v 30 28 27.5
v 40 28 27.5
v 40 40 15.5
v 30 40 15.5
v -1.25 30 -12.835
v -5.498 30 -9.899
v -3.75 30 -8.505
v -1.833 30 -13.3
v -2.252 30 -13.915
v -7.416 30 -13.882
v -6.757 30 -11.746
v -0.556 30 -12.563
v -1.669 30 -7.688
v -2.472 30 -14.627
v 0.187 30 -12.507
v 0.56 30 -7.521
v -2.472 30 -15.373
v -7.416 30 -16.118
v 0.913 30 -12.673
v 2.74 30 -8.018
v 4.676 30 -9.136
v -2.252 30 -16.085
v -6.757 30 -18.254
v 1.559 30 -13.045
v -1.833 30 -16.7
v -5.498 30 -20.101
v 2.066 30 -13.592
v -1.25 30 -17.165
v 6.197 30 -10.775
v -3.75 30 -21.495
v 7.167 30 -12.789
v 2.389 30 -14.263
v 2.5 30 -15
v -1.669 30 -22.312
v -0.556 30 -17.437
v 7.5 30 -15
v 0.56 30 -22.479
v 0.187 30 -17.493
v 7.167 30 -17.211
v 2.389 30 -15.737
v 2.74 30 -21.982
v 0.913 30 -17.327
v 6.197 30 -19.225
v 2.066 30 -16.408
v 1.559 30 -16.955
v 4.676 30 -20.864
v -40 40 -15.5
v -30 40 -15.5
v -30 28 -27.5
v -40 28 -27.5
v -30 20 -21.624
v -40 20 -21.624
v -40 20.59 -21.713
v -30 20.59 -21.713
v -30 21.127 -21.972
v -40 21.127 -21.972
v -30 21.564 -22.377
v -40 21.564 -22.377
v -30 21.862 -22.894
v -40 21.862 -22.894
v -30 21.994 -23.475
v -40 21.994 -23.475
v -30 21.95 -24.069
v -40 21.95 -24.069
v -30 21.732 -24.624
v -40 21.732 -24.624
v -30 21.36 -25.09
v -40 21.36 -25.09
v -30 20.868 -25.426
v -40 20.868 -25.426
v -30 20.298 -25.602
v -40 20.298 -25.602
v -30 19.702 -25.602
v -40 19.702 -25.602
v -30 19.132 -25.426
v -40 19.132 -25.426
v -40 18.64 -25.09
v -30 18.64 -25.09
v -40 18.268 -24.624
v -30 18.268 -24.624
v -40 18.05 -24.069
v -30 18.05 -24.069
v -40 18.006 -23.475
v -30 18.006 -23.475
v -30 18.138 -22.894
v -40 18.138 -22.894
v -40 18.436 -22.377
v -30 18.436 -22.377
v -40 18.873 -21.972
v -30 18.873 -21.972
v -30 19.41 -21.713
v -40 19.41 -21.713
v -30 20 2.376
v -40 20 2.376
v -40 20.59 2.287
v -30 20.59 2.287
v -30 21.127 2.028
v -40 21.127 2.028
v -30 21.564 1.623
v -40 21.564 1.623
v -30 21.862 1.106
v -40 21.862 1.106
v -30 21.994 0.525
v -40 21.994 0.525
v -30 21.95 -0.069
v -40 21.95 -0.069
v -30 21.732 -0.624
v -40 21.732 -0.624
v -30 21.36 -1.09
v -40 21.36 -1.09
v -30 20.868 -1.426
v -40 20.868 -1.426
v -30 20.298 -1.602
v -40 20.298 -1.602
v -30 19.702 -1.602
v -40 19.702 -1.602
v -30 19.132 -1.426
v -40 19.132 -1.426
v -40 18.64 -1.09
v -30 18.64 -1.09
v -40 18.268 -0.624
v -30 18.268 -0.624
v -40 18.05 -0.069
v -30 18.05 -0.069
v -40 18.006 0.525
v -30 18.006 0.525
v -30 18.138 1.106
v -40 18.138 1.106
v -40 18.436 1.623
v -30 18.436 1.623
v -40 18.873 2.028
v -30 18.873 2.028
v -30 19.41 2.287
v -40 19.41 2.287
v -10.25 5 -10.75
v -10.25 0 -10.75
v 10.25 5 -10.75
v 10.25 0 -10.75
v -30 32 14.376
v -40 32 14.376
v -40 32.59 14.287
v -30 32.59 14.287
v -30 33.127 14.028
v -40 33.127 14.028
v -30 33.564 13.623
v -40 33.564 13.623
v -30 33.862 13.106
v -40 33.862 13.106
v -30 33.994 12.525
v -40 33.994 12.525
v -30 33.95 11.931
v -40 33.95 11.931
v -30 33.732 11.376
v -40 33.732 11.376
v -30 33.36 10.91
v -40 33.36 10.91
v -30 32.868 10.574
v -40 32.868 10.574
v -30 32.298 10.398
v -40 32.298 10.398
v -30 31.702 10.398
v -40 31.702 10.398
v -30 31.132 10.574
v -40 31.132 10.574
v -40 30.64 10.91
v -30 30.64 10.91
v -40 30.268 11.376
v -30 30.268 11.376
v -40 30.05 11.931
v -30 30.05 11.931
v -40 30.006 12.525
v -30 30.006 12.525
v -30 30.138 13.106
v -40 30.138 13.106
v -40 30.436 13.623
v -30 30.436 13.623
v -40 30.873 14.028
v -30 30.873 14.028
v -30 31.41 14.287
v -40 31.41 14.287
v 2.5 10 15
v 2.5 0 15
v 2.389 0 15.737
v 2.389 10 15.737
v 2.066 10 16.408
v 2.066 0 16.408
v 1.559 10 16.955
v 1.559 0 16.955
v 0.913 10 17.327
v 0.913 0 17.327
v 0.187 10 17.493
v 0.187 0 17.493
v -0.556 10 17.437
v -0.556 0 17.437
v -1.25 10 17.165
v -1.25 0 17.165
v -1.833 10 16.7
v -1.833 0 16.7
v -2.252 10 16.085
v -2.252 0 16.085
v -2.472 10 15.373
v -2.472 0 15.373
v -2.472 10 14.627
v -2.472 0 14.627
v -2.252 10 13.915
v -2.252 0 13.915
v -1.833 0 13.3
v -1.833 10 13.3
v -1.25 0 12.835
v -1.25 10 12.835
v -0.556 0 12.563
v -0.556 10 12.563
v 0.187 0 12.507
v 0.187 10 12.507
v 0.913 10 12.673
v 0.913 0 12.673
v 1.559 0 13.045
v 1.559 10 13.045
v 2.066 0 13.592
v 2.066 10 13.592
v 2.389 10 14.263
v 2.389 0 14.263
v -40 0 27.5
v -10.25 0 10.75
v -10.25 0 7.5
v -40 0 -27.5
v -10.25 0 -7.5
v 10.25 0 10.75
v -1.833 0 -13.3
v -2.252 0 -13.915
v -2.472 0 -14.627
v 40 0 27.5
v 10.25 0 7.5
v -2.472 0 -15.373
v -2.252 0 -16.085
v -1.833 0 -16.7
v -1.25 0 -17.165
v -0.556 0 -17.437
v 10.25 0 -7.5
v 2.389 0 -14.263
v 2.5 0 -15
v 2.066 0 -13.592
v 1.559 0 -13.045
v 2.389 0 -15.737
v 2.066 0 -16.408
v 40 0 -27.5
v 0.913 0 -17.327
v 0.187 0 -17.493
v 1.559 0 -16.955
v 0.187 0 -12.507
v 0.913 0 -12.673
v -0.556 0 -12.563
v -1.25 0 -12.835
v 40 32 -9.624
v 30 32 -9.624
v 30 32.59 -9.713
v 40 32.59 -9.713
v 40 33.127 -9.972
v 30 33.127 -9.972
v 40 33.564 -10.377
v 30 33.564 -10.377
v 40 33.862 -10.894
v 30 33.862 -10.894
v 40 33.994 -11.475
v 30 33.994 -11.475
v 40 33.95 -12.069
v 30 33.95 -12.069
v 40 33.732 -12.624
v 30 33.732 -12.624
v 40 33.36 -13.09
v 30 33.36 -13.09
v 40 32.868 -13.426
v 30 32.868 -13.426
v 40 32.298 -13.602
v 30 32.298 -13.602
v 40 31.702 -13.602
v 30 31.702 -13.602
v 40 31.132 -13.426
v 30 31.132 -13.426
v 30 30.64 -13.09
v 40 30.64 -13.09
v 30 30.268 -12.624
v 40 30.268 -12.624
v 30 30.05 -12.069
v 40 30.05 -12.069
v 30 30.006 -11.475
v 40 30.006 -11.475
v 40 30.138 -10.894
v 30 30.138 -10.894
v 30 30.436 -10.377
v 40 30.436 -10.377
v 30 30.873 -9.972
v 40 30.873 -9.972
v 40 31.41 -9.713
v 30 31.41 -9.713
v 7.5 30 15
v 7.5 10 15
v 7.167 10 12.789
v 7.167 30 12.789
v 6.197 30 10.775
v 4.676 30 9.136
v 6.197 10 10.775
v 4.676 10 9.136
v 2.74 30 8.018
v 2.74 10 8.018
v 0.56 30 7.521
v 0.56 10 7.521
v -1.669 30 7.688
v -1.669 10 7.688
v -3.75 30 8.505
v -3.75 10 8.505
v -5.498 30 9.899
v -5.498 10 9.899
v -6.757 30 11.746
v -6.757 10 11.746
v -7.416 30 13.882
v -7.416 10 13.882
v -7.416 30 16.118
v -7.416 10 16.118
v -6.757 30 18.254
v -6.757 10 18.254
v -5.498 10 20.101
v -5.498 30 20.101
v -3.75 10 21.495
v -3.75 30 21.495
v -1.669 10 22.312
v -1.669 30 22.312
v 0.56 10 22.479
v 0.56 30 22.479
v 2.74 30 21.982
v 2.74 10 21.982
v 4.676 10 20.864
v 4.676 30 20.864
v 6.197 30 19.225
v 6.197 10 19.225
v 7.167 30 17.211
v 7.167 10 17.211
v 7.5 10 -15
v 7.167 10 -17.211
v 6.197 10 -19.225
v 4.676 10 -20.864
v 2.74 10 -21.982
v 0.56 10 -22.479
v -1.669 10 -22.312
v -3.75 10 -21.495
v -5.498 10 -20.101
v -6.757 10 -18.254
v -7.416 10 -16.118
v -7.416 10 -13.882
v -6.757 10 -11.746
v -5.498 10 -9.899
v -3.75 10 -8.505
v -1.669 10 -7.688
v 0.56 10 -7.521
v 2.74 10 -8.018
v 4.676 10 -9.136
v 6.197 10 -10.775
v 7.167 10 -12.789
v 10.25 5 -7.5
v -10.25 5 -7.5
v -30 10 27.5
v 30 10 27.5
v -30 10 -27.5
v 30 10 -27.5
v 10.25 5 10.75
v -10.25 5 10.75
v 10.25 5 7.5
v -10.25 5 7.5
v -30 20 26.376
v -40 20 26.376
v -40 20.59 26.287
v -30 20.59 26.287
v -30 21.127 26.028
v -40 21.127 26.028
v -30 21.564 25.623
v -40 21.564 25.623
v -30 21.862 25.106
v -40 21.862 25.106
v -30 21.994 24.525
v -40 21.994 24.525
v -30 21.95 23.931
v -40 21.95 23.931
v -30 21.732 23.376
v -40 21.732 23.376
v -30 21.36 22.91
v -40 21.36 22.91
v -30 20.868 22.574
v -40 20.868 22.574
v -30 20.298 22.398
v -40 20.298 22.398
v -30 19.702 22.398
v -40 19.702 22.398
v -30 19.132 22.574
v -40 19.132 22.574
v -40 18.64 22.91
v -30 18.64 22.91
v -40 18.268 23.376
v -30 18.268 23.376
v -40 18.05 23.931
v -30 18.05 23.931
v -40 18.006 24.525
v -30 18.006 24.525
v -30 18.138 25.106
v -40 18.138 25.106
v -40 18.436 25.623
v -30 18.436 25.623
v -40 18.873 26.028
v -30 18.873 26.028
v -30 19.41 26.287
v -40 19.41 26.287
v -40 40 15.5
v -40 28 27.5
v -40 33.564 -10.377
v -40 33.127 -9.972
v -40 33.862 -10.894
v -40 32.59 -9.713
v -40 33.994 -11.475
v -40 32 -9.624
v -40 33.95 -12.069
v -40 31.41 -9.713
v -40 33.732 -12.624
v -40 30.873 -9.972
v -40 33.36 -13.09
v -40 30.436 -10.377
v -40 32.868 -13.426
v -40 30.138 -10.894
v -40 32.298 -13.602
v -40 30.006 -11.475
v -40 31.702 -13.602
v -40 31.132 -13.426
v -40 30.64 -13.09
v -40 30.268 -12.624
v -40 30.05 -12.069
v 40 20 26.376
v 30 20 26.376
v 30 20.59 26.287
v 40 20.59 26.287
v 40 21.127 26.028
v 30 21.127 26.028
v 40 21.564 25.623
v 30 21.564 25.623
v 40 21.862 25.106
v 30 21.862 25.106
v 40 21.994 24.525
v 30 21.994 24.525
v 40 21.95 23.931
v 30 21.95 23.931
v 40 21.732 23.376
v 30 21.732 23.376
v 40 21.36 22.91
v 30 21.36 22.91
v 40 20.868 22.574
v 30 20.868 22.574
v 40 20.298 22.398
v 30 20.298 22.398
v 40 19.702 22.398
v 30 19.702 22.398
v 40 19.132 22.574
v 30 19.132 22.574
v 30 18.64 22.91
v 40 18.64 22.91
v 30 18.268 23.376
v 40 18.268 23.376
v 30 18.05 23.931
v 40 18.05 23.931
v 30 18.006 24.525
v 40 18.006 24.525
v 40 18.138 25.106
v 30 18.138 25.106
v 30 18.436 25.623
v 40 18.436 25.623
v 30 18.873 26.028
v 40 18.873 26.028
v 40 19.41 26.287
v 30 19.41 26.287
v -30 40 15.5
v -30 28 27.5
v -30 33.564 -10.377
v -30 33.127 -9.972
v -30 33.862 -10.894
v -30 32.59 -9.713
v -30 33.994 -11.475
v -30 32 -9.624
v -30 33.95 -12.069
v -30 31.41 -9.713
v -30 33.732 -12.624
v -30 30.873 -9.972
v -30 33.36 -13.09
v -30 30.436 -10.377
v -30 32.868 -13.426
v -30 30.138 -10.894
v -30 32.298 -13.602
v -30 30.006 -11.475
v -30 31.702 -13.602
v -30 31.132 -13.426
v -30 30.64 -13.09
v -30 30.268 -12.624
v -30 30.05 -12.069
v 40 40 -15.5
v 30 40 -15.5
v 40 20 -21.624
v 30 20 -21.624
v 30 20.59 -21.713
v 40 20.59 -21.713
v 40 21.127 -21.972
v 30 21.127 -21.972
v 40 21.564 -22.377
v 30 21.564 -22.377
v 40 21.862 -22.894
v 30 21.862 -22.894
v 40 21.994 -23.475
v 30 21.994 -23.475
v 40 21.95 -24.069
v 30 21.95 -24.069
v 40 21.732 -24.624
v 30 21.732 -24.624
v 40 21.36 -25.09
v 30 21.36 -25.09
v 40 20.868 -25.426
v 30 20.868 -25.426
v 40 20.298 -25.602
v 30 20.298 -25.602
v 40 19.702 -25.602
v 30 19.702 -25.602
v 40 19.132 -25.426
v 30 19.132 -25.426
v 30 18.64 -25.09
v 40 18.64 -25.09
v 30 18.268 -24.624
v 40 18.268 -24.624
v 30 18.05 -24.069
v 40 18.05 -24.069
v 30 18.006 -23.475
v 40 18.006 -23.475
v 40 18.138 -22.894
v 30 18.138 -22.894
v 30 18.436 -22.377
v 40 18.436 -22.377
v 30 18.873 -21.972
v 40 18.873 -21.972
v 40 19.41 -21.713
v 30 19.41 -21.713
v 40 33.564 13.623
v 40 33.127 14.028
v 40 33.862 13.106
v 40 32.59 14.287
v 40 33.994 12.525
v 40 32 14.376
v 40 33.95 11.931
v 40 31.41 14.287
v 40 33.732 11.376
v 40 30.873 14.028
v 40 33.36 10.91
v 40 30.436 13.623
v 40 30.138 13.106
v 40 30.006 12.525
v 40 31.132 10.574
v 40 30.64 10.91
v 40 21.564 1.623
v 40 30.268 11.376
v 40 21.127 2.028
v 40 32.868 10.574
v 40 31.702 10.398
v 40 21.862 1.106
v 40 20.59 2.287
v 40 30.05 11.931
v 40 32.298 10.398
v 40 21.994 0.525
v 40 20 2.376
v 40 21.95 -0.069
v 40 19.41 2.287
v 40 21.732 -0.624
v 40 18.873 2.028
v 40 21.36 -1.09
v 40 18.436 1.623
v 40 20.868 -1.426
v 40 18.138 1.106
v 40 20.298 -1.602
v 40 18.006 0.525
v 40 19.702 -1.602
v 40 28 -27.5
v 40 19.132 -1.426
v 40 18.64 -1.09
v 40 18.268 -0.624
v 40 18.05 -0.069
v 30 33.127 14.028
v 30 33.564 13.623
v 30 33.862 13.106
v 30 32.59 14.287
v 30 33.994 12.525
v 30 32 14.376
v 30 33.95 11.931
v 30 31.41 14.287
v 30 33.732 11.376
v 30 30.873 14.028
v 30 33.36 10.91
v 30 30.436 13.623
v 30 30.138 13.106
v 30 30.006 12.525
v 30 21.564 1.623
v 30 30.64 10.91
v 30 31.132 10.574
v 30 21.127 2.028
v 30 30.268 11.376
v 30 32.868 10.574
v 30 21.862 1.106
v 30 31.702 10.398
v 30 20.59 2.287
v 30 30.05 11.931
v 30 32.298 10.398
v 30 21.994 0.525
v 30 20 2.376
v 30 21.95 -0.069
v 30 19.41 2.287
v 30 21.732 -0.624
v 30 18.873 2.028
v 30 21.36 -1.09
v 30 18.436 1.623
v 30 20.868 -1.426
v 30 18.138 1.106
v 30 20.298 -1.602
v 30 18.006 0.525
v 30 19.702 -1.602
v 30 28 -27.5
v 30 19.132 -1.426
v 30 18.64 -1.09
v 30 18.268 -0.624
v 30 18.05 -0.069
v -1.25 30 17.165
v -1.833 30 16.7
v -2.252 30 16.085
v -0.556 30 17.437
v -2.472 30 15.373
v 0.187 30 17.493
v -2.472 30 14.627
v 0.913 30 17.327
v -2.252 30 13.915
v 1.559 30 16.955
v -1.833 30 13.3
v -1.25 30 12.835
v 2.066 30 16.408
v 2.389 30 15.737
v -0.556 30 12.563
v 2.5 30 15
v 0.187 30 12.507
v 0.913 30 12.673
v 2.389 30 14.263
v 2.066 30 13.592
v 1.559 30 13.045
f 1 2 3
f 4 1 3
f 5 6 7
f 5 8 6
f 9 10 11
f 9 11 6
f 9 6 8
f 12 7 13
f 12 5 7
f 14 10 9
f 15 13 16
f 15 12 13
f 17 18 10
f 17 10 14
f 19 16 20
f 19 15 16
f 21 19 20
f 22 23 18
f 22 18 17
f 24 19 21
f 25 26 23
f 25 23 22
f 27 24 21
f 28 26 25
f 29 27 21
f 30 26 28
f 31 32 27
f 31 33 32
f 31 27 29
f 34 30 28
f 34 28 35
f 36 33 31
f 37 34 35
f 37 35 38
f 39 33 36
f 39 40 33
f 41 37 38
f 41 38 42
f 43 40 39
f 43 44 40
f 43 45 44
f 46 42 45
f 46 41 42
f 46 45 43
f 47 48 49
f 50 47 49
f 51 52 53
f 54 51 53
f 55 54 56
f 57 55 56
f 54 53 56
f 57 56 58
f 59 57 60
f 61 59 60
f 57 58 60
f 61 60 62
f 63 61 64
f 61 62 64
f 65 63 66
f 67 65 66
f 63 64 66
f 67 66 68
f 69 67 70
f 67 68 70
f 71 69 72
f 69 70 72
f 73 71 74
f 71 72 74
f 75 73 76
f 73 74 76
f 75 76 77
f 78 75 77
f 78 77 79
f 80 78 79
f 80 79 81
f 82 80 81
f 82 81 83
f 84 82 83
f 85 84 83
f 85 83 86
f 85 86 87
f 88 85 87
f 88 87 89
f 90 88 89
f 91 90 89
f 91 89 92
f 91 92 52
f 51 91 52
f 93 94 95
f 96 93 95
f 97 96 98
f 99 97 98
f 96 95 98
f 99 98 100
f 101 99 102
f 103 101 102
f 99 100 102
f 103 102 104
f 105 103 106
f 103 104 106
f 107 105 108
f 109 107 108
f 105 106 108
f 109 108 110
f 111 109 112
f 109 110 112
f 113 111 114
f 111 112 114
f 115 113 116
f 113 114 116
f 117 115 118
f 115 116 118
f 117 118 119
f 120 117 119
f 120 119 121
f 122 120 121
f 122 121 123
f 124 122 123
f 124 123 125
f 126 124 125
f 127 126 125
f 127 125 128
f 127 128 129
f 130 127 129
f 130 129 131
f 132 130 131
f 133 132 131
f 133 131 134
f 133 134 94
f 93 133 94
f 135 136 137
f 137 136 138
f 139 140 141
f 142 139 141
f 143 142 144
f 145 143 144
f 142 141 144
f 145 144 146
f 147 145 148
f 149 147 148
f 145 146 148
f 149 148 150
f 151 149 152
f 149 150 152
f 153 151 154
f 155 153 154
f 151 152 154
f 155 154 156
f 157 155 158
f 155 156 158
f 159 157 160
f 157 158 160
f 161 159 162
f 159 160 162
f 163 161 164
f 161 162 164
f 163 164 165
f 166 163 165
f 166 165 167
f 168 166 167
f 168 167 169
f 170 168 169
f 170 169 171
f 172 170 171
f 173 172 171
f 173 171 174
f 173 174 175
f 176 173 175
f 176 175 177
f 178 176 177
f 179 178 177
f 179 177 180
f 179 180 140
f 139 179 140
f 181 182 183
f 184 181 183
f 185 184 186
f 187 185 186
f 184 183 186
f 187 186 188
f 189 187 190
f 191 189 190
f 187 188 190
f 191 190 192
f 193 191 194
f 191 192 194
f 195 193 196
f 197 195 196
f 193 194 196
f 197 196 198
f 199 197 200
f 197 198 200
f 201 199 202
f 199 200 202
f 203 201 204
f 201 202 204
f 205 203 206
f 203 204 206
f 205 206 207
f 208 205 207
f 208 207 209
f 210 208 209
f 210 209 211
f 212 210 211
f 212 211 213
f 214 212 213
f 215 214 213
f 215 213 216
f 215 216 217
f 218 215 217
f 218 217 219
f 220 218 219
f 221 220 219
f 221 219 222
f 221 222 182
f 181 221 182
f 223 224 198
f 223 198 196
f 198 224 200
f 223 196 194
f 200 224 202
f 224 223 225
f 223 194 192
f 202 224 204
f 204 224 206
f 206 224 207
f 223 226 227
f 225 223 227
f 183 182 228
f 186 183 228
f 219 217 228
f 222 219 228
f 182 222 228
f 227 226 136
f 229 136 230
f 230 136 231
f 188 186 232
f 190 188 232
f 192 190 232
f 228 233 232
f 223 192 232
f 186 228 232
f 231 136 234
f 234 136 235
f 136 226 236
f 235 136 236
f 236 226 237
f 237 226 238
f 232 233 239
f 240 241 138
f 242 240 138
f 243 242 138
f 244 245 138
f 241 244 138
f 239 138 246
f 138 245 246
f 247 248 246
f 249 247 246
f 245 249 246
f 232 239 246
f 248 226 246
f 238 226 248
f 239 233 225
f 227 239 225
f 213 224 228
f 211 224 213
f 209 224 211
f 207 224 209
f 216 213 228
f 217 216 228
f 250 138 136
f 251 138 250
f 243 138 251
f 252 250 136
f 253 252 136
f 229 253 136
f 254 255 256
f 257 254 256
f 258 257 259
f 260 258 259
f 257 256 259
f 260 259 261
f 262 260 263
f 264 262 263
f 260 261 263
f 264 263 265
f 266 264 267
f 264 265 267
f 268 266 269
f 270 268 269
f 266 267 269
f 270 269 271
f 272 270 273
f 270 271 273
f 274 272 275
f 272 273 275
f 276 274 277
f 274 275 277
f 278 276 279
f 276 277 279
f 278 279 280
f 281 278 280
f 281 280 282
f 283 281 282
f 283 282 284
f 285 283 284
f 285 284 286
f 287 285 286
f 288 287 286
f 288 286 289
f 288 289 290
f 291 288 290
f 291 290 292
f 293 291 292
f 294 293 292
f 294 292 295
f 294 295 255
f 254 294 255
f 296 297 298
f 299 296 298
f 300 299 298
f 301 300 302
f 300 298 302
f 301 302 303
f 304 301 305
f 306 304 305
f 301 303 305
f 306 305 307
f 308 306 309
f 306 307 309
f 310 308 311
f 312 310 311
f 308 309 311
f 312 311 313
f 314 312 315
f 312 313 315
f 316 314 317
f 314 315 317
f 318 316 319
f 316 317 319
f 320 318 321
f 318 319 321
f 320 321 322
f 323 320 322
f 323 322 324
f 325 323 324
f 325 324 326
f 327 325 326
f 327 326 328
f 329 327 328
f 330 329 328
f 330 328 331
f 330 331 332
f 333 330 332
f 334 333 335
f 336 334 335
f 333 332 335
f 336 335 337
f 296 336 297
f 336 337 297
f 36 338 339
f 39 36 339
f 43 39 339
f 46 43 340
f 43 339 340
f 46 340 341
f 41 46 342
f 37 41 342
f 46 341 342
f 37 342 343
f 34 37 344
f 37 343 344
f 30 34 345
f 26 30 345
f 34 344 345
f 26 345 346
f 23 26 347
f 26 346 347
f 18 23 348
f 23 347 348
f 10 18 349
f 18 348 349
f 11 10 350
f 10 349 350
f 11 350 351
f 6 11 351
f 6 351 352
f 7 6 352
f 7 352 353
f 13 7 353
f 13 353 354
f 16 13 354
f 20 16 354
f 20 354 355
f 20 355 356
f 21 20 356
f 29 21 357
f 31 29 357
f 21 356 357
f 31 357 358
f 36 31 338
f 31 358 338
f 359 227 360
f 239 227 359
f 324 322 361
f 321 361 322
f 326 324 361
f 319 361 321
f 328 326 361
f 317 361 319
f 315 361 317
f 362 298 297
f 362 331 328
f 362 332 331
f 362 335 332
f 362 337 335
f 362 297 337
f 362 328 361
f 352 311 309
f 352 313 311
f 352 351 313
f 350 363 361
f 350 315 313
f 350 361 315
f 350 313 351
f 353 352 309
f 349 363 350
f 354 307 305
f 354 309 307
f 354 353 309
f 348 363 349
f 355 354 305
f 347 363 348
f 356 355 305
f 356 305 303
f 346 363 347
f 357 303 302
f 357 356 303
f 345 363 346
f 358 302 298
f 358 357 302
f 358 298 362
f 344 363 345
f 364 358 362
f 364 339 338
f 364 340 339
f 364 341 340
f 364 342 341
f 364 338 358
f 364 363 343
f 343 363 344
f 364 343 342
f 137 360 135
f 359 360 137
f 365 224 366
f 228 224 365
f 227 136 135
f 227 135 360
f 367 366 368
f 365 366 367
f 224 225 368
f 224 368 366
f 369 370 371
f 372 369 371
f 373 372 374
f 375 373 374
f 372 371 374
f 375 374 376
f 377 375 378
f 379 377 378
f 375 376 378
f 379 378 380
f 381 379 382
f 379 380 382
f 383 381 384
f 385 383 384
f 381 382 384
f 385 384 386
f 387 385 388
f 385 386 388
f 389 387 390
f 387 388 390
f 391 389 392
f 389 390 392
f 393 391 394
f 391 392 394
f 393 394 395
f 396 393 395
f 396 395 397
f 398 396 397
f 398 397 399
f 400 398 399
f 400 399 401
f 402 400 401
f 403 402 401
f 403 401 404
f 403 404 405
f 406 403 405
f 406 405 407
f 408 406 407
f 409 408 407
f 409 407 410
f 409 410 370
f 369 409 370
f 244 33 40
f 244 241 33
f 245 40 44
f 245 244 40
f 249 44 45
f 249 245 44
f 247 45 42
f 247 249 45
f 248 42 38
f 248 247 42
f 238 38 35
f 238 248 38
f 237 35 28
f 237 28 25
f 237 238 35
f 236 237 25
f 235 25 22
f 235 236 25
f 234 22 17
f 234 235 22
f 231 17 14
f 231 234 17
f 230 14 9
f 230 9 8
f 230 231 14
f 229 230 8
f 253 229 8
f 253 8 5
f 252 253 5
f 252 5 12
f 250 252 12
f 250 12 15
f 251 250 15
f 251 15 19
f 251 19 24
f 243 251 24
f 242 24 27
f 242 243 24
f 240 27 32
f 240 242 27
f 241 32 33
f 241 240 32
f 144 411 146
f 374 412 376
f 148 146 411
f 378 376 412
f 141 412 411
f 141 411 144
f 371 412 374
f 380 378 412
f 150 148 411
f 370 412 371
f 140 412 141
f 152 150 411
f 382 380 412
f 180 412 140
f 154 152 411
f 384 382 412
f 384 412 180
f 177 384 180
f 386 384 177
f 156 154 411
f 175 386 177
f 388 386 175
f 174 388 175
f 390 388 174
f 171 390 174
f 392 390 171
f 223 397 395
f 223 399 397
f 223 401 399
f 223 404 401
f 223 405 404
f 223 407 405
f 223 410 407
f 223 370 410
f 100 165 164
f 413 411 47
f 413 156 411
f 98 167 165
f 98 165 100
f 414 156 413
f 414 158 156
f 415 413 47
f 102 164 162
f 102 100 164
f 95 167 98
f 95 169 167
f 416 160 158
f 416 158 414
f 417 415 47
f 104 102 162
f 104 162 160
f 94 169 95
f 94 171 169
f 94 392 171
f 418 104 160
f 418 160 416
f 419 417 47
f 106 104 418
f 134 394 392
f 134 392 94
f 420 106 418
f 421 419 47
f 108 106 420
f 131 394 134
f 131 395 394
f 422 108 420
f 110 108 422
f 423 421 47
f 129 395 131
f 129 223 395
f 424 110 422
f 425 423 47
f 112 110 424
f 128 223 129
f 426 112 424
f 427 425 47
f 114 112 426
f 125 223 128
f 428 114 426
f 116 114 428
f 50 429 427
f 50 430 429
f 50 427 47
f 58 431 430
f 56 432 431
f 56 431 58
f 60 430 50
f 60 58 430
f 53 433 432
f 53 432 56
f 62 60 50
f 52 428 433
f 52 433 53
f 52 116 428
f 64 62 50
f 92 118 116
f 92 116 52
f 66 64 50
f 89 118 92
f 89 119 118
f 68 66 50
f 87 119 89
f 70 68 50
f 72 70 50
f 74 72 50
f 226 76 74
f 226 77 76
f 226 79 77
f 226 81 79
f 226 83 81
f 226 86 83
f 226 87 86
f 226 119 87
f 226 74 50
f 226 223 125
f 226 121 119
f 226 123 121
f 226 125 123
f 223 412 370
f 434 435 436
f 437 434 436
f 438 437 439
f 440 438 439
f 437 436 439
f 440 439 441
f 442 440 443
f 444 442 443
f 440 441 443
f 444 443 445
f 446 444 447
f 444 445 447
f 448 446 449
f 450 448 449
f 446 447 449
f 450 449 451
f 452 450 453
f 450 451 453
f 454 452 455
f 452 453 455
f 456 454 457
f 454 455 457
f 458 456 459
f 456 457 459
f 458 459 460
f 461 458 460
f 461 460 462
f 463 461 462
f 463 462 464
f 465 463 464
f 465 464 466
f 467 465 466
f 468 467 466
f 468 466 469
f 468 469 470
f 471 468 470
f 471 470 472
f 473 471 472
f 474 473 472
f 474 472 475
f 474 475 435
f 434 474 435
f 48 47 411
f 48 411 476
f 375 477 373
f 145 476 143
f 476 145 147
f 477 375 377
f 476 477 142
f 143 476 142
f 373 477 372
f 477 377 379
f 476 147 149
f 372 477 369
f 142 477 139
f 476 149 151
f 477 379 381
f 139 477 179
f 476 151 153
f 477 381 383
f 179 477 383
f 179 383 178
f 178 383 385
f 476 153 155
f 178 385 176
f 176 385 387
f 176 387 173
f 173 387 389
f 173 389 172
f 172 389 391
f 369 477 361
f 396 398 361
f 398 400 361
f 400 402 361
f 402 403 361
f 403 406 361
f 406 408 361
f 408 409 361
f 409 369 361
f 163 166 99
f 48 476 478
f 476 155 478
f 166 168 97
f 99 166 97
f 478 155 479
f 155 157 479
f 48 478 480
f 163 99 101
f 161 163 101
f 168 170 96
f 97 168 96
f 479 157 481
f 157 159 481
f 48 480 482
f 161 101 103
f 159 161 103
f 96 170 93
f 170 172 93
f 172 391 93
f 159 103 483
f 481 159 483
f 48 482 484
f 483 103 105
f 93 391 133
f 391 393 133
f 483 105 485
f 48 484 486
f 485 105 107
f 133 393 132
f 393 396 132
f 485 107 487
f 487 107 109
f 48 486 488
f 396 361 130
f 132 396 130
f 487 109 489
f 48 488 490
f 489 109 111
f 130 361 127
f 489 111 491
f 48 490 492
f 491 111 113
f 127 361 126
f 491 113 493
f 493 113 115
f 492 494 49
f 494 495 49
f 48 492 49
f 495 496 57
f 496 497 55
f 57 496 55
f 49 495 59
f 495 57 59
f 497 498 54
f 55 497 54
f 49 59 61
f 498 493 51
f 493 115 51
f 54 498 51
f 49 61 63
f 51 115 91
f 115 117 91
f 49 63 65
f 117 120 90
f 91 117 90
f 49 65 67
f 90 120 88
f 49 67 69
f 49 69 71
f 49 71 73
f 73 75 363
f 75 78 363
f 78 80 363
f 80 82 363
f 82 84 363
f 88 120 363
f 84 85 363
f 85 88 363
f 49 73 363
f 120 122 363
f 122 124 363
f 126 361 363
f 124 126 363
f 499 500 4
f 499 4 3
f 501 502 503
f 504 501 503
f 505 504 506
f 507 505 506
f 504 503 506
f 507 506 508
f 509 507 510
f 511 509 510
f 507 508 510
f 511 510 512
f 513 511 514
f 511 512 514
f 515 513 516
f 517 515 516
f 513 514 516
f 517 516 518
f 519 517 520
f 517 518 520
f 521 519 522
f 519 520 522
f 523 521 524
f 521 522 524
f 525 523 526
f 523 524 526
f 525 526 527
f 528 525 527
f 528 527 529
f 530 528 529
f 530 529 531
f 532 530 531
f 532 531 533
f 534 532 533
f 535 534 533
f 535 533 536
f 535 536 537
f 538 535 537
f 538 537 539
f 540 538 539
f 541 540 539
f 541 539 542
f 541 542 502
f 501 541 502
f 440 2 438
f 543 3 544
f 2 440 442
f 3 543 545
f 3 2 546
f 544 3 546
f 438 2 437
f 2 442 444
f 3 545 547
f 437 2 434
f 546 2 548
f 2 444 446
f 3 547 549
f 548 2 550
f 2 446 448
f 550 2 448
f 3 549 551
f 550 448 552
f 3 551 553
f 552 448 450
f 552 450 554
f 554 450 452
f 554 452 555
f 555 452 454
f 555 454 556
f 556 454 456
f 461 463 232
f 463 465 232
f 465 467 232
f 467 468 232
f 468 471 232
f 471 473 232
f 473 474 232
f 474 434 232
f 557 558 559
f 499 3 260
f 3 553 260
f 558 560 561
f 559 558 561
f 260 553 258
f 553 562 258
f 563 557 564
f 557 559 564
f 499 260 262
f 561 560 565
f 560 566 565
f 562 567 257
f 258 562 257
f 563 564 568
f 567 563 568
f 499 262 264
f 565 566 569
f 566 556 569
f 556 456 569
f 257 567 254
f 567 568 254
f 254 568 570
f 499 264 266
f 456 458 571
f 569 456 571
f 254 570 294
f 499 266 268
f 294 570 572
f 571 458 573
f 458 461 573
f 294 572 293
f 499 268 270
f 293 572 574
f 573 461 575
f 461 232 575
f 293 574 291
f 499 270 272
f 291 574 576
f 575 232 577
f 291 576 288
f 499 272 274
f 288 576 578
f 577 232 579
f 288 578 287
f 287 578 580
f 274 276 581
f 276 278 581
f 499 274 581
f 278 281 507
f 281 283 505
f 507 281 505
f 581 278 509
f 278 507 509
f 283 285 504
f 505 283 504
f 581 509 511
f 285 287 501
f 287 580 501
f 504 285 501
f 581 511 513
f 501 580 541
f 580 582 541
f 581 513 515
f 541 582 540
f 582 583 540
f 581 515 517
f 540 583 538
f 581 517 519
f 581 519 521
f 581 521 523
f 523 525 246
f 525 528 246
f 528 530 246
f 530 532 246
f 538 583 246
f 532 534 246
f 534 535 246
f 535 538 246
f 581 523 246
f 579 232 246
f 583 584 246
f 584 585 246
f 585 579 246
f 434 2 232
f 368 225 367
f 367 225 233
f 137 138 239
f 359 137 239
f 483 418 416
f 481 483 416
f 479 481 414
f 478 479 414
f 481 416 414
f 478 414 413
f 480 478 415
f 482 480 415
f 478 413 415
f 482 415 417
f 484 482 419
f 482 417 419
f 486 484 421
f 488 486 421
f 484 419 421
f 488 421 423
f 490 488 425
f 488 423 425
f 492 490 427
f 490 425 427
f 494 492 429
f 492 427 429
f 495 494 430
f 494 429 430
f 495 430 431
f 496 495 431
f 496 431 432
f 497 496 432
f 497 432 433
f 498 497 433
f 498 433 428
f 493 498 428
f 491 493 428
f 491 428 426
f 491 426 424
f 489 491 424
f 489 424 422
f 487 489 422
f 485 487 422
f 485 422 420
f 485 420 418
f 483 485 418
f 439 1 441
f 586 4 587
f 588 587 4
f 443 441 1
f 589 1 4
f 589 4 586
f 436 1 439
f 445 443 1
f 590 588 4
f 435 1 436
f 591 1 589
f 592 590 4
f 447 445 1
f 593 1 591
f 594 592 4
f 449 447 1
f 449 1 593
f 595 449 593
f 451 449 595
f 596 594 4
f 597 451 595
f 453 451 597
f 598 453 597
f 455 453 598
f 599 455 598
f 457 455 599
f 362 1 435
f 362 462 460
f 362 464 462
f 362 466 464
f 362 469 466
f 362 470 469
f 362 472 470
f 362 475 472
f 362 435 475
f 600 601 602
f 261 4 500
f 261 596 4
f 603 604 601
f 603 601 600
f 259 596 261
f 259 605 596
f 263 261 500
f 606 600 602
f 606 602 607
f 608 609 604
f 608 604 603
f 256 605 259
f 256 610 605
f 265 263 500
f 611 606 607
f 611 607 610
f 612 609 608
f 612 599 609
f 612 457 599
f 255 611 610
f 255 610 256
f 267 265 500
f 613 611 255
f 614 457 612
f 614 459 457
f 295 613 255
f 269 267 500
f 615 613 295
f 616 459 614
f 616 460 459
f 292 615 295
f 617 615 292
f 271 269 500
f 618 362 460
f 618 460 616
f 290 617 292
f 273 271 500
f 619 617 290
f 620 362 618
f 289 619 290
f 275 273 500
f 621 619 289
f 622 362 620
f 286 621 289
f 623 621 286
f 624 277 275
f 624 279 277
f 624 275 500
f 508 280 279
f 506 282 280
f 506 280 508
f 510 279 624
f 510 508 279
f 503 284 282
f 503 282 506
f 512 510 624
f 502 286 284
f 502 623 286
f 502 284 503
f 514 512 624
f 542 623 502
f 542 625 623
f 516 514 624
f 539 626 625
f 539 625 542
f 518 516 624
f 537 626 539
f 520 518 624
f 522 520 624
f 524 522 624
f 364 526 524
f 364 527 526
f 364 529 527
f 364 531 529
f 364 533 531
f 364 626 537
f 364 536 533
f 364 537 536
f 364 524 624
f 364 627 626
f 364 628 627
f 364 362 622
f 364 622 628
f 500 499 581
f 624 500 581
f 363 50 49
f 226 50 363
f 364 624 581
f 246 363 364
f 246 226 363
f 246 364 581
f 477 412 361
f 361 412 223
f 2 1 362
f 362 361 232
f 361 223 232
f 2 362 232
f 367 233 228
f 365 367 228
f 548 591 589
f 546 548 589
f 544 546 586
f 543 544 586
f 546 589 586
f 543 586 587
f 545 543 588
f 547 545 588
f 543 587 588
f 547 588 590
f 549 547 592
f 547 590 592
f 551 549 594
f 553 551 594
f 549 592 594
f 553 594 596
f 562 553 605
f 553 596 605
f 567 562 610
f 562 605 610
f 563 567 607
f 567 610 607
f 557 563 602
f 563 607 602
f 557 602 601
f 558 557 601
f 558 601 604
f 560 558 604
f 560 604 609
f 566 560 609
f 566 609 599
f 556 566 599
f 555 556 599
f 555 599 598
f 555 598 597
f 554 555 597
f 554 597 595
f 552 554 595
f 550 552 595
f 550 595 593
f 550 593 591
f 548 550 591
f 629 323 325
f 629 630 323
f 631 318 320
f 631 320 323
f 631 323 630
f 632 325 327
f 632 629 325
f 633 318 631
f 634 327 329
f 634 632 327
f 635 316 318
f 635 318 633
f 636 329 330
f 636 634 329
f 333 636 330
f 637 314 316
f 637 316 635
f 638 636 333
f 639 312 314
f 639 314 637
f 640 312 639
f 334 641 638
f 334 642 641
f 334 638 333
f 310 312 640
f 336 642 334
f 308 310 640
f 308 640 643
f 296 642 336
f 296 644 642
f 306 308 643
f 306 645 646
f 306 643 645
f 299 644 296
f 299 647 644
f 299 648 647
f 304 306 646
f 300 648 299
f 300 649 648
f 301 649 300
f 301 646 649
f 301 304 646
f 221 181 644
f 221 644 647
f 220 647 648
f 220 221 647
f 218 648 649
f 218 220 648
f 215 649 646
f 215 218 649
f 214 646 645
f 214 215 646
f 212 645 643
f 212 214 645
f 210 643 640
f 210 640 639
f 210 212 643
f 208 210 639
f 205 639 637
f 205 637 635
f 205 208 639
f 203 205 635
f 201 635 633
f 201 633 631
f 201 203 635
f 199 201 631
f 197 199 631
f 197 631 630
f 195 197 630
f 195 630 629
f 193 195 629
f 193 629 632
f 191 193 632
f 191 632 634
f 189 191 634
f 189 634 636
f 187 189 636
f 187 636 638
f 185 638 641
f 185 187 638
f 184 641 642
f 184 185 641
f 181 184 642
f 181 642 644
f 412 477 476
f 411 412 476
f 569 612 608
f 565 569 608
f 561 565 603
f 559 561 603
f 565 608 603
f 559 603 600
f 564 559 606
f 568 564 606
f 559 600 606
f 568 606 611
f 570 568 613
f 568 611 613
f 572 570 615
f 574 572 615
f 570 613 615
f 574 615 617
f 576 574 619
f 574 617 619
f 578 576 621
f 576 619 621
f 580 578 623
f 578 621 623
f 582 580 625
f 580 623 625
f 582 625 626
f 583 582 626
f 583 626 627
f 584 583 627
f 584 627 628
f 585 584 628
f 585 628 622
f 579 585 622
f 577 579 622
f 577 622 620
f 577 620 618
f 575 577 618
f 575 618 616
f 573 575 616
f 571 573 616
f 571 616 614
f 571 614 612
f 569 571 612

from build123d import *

# Parameters (mm, degrees)
SKETCH1_W           = 80
SKETCH1_H           = 55
BOSS_EXTRUDE1_DEPTH = 10
SKETCH2_W           = 10
SKETCH2_H           = 55
BOSS_EXTRUDE2_DEPTH = 30
SKETCH3_R           = 2
CUT_EXTRUDE1_DEPTH  = 81
SKETCH4_R           = 2.5
CUT_EXTRUDE2_DEPTH  = 30
SKETCH5_R           = 7.5
SKETCH5_R_2         = 2.5
BOSS_EXTRUDE3_DEPTH = 20
SKETCH6_W           = 20.5
SKETCH6_H           = 3.25
CUT_EXTRUDE3_DEPTH  = 5
CUT_EXTRUDE4_DEPTH  = 81


with BuildPart() as part:
    # Sketch1 → Boss-Extrude1 (new body)
    with BuildSketch(Plane(origin=(0, 0, 0), x_dir=(1, 0, 0), z_dir=(0, 1, 0))):
        Rectangle(SKETCH1_W, SKETCH1_H)
    extrude(amount=BOSS_EXTRUDE1_DEPTH)

    # Sketch2 → Boss-Extrude2 (add)
    with BuildSketch(Plane(origin=(0, 10, 0), x_dir=(1, 0, 0), z_dir=(0, 1, 0))):
        with Locations((-35, 0)):
            Rectangle(SKETCH2_W, SKETCH2_H)
        with Locations((35, 0)):
            Rectangle(SKETCH2_W, SKETCH2_H)
    extrude(amount=BOSS_EXTRUDE2_DEPTH)

    # Sketch3 → Cut-Extrude1 (cut, through all)
    with BuildSketch(Plane.ZY.offset(40)):
        with Locations((-23.624192801, 20)):
            Circle(SKETCH3_R)
        with Locations((0.375807199, 20)):
            Circle(SKETCH3_R)
        with Locations((24.375807199, 20)):
            Circle(SKETCH3_R)
        with Locations((-11.624192801, 32)):
            Circle(SKETCH3_R)
        with Locations((12.375807199, 32)):
            Circle(SKETCH3_R)
    extrude(amount=-CUT_EXTRUDE1_DEPTH, mode=Mode.SUBTRACT)

    # Sketch4 → Cut-Extrude2 (cut)
    with BuildSketch(Plane.XZ):
        with Locations((0, 15)):
            Circle(SKETCH4_R)
        with Locations((0, -15)):
            Circle(SKETCH4_R)
    extrude(amount=-CUT_EXTRUDE2_DEPTH, mode=Mode.SUBTRACT)

    # Sketch5 → Boss-Extrude3 (add)
    with BuildSketch(Plane(origin=(0, 10, 0), x_dir=(1, 0, 0), z_dir=(0, 1, 0))):
        with Locations((0, 15)):
            Circle(SKETCH5_R)
        with Locations((0, 15)):
            Circle(SKETCH5_R_2, mode=Mode.SUBTRACT)
        with Locations((0, -15)):
            Circle(SKETCH5_R)
        with Locations((0, -15)):
            Circle(SKETCH5_R_2, mode=Mode.SUBTRACT)
    extrude(amount=BOSS_EXTRUDE3_DEPTH)

    # Sketch6 → Cut-Extrude3 (cut)
    with BuildSketch(Plane.XZ):
        with Locations((0, 9.125)):
            Rectangle(SKETCH6_W, SKETCH6_H)
        with Locations((0, -9.125)):
            Rectangle(SKETCH6_W, SKETCH6_H)
    extrude(amount=-CUT_EXTRUDE3_DEPTH, mode=Mode.SUBTRACT)

    # Sketch7 → Cut-Extrude4 (cut, through all)
    with BuildSketch(Plane(origin=(40, 0, 0), x_dir=(0, 0, -1), z_dir=(1, 0, 0))):
        Polygon((-27.5, 28), (-15.5, 40), (-27.5, 40), align=None)
        Polygon((15.5, 40), (27.5, 28), (27.5, 40), align=None)
    extrude(amount=-CUT_EXTRUDE4_DEPTH, mode=Mode.SUBTRACT)


solid = part.part
